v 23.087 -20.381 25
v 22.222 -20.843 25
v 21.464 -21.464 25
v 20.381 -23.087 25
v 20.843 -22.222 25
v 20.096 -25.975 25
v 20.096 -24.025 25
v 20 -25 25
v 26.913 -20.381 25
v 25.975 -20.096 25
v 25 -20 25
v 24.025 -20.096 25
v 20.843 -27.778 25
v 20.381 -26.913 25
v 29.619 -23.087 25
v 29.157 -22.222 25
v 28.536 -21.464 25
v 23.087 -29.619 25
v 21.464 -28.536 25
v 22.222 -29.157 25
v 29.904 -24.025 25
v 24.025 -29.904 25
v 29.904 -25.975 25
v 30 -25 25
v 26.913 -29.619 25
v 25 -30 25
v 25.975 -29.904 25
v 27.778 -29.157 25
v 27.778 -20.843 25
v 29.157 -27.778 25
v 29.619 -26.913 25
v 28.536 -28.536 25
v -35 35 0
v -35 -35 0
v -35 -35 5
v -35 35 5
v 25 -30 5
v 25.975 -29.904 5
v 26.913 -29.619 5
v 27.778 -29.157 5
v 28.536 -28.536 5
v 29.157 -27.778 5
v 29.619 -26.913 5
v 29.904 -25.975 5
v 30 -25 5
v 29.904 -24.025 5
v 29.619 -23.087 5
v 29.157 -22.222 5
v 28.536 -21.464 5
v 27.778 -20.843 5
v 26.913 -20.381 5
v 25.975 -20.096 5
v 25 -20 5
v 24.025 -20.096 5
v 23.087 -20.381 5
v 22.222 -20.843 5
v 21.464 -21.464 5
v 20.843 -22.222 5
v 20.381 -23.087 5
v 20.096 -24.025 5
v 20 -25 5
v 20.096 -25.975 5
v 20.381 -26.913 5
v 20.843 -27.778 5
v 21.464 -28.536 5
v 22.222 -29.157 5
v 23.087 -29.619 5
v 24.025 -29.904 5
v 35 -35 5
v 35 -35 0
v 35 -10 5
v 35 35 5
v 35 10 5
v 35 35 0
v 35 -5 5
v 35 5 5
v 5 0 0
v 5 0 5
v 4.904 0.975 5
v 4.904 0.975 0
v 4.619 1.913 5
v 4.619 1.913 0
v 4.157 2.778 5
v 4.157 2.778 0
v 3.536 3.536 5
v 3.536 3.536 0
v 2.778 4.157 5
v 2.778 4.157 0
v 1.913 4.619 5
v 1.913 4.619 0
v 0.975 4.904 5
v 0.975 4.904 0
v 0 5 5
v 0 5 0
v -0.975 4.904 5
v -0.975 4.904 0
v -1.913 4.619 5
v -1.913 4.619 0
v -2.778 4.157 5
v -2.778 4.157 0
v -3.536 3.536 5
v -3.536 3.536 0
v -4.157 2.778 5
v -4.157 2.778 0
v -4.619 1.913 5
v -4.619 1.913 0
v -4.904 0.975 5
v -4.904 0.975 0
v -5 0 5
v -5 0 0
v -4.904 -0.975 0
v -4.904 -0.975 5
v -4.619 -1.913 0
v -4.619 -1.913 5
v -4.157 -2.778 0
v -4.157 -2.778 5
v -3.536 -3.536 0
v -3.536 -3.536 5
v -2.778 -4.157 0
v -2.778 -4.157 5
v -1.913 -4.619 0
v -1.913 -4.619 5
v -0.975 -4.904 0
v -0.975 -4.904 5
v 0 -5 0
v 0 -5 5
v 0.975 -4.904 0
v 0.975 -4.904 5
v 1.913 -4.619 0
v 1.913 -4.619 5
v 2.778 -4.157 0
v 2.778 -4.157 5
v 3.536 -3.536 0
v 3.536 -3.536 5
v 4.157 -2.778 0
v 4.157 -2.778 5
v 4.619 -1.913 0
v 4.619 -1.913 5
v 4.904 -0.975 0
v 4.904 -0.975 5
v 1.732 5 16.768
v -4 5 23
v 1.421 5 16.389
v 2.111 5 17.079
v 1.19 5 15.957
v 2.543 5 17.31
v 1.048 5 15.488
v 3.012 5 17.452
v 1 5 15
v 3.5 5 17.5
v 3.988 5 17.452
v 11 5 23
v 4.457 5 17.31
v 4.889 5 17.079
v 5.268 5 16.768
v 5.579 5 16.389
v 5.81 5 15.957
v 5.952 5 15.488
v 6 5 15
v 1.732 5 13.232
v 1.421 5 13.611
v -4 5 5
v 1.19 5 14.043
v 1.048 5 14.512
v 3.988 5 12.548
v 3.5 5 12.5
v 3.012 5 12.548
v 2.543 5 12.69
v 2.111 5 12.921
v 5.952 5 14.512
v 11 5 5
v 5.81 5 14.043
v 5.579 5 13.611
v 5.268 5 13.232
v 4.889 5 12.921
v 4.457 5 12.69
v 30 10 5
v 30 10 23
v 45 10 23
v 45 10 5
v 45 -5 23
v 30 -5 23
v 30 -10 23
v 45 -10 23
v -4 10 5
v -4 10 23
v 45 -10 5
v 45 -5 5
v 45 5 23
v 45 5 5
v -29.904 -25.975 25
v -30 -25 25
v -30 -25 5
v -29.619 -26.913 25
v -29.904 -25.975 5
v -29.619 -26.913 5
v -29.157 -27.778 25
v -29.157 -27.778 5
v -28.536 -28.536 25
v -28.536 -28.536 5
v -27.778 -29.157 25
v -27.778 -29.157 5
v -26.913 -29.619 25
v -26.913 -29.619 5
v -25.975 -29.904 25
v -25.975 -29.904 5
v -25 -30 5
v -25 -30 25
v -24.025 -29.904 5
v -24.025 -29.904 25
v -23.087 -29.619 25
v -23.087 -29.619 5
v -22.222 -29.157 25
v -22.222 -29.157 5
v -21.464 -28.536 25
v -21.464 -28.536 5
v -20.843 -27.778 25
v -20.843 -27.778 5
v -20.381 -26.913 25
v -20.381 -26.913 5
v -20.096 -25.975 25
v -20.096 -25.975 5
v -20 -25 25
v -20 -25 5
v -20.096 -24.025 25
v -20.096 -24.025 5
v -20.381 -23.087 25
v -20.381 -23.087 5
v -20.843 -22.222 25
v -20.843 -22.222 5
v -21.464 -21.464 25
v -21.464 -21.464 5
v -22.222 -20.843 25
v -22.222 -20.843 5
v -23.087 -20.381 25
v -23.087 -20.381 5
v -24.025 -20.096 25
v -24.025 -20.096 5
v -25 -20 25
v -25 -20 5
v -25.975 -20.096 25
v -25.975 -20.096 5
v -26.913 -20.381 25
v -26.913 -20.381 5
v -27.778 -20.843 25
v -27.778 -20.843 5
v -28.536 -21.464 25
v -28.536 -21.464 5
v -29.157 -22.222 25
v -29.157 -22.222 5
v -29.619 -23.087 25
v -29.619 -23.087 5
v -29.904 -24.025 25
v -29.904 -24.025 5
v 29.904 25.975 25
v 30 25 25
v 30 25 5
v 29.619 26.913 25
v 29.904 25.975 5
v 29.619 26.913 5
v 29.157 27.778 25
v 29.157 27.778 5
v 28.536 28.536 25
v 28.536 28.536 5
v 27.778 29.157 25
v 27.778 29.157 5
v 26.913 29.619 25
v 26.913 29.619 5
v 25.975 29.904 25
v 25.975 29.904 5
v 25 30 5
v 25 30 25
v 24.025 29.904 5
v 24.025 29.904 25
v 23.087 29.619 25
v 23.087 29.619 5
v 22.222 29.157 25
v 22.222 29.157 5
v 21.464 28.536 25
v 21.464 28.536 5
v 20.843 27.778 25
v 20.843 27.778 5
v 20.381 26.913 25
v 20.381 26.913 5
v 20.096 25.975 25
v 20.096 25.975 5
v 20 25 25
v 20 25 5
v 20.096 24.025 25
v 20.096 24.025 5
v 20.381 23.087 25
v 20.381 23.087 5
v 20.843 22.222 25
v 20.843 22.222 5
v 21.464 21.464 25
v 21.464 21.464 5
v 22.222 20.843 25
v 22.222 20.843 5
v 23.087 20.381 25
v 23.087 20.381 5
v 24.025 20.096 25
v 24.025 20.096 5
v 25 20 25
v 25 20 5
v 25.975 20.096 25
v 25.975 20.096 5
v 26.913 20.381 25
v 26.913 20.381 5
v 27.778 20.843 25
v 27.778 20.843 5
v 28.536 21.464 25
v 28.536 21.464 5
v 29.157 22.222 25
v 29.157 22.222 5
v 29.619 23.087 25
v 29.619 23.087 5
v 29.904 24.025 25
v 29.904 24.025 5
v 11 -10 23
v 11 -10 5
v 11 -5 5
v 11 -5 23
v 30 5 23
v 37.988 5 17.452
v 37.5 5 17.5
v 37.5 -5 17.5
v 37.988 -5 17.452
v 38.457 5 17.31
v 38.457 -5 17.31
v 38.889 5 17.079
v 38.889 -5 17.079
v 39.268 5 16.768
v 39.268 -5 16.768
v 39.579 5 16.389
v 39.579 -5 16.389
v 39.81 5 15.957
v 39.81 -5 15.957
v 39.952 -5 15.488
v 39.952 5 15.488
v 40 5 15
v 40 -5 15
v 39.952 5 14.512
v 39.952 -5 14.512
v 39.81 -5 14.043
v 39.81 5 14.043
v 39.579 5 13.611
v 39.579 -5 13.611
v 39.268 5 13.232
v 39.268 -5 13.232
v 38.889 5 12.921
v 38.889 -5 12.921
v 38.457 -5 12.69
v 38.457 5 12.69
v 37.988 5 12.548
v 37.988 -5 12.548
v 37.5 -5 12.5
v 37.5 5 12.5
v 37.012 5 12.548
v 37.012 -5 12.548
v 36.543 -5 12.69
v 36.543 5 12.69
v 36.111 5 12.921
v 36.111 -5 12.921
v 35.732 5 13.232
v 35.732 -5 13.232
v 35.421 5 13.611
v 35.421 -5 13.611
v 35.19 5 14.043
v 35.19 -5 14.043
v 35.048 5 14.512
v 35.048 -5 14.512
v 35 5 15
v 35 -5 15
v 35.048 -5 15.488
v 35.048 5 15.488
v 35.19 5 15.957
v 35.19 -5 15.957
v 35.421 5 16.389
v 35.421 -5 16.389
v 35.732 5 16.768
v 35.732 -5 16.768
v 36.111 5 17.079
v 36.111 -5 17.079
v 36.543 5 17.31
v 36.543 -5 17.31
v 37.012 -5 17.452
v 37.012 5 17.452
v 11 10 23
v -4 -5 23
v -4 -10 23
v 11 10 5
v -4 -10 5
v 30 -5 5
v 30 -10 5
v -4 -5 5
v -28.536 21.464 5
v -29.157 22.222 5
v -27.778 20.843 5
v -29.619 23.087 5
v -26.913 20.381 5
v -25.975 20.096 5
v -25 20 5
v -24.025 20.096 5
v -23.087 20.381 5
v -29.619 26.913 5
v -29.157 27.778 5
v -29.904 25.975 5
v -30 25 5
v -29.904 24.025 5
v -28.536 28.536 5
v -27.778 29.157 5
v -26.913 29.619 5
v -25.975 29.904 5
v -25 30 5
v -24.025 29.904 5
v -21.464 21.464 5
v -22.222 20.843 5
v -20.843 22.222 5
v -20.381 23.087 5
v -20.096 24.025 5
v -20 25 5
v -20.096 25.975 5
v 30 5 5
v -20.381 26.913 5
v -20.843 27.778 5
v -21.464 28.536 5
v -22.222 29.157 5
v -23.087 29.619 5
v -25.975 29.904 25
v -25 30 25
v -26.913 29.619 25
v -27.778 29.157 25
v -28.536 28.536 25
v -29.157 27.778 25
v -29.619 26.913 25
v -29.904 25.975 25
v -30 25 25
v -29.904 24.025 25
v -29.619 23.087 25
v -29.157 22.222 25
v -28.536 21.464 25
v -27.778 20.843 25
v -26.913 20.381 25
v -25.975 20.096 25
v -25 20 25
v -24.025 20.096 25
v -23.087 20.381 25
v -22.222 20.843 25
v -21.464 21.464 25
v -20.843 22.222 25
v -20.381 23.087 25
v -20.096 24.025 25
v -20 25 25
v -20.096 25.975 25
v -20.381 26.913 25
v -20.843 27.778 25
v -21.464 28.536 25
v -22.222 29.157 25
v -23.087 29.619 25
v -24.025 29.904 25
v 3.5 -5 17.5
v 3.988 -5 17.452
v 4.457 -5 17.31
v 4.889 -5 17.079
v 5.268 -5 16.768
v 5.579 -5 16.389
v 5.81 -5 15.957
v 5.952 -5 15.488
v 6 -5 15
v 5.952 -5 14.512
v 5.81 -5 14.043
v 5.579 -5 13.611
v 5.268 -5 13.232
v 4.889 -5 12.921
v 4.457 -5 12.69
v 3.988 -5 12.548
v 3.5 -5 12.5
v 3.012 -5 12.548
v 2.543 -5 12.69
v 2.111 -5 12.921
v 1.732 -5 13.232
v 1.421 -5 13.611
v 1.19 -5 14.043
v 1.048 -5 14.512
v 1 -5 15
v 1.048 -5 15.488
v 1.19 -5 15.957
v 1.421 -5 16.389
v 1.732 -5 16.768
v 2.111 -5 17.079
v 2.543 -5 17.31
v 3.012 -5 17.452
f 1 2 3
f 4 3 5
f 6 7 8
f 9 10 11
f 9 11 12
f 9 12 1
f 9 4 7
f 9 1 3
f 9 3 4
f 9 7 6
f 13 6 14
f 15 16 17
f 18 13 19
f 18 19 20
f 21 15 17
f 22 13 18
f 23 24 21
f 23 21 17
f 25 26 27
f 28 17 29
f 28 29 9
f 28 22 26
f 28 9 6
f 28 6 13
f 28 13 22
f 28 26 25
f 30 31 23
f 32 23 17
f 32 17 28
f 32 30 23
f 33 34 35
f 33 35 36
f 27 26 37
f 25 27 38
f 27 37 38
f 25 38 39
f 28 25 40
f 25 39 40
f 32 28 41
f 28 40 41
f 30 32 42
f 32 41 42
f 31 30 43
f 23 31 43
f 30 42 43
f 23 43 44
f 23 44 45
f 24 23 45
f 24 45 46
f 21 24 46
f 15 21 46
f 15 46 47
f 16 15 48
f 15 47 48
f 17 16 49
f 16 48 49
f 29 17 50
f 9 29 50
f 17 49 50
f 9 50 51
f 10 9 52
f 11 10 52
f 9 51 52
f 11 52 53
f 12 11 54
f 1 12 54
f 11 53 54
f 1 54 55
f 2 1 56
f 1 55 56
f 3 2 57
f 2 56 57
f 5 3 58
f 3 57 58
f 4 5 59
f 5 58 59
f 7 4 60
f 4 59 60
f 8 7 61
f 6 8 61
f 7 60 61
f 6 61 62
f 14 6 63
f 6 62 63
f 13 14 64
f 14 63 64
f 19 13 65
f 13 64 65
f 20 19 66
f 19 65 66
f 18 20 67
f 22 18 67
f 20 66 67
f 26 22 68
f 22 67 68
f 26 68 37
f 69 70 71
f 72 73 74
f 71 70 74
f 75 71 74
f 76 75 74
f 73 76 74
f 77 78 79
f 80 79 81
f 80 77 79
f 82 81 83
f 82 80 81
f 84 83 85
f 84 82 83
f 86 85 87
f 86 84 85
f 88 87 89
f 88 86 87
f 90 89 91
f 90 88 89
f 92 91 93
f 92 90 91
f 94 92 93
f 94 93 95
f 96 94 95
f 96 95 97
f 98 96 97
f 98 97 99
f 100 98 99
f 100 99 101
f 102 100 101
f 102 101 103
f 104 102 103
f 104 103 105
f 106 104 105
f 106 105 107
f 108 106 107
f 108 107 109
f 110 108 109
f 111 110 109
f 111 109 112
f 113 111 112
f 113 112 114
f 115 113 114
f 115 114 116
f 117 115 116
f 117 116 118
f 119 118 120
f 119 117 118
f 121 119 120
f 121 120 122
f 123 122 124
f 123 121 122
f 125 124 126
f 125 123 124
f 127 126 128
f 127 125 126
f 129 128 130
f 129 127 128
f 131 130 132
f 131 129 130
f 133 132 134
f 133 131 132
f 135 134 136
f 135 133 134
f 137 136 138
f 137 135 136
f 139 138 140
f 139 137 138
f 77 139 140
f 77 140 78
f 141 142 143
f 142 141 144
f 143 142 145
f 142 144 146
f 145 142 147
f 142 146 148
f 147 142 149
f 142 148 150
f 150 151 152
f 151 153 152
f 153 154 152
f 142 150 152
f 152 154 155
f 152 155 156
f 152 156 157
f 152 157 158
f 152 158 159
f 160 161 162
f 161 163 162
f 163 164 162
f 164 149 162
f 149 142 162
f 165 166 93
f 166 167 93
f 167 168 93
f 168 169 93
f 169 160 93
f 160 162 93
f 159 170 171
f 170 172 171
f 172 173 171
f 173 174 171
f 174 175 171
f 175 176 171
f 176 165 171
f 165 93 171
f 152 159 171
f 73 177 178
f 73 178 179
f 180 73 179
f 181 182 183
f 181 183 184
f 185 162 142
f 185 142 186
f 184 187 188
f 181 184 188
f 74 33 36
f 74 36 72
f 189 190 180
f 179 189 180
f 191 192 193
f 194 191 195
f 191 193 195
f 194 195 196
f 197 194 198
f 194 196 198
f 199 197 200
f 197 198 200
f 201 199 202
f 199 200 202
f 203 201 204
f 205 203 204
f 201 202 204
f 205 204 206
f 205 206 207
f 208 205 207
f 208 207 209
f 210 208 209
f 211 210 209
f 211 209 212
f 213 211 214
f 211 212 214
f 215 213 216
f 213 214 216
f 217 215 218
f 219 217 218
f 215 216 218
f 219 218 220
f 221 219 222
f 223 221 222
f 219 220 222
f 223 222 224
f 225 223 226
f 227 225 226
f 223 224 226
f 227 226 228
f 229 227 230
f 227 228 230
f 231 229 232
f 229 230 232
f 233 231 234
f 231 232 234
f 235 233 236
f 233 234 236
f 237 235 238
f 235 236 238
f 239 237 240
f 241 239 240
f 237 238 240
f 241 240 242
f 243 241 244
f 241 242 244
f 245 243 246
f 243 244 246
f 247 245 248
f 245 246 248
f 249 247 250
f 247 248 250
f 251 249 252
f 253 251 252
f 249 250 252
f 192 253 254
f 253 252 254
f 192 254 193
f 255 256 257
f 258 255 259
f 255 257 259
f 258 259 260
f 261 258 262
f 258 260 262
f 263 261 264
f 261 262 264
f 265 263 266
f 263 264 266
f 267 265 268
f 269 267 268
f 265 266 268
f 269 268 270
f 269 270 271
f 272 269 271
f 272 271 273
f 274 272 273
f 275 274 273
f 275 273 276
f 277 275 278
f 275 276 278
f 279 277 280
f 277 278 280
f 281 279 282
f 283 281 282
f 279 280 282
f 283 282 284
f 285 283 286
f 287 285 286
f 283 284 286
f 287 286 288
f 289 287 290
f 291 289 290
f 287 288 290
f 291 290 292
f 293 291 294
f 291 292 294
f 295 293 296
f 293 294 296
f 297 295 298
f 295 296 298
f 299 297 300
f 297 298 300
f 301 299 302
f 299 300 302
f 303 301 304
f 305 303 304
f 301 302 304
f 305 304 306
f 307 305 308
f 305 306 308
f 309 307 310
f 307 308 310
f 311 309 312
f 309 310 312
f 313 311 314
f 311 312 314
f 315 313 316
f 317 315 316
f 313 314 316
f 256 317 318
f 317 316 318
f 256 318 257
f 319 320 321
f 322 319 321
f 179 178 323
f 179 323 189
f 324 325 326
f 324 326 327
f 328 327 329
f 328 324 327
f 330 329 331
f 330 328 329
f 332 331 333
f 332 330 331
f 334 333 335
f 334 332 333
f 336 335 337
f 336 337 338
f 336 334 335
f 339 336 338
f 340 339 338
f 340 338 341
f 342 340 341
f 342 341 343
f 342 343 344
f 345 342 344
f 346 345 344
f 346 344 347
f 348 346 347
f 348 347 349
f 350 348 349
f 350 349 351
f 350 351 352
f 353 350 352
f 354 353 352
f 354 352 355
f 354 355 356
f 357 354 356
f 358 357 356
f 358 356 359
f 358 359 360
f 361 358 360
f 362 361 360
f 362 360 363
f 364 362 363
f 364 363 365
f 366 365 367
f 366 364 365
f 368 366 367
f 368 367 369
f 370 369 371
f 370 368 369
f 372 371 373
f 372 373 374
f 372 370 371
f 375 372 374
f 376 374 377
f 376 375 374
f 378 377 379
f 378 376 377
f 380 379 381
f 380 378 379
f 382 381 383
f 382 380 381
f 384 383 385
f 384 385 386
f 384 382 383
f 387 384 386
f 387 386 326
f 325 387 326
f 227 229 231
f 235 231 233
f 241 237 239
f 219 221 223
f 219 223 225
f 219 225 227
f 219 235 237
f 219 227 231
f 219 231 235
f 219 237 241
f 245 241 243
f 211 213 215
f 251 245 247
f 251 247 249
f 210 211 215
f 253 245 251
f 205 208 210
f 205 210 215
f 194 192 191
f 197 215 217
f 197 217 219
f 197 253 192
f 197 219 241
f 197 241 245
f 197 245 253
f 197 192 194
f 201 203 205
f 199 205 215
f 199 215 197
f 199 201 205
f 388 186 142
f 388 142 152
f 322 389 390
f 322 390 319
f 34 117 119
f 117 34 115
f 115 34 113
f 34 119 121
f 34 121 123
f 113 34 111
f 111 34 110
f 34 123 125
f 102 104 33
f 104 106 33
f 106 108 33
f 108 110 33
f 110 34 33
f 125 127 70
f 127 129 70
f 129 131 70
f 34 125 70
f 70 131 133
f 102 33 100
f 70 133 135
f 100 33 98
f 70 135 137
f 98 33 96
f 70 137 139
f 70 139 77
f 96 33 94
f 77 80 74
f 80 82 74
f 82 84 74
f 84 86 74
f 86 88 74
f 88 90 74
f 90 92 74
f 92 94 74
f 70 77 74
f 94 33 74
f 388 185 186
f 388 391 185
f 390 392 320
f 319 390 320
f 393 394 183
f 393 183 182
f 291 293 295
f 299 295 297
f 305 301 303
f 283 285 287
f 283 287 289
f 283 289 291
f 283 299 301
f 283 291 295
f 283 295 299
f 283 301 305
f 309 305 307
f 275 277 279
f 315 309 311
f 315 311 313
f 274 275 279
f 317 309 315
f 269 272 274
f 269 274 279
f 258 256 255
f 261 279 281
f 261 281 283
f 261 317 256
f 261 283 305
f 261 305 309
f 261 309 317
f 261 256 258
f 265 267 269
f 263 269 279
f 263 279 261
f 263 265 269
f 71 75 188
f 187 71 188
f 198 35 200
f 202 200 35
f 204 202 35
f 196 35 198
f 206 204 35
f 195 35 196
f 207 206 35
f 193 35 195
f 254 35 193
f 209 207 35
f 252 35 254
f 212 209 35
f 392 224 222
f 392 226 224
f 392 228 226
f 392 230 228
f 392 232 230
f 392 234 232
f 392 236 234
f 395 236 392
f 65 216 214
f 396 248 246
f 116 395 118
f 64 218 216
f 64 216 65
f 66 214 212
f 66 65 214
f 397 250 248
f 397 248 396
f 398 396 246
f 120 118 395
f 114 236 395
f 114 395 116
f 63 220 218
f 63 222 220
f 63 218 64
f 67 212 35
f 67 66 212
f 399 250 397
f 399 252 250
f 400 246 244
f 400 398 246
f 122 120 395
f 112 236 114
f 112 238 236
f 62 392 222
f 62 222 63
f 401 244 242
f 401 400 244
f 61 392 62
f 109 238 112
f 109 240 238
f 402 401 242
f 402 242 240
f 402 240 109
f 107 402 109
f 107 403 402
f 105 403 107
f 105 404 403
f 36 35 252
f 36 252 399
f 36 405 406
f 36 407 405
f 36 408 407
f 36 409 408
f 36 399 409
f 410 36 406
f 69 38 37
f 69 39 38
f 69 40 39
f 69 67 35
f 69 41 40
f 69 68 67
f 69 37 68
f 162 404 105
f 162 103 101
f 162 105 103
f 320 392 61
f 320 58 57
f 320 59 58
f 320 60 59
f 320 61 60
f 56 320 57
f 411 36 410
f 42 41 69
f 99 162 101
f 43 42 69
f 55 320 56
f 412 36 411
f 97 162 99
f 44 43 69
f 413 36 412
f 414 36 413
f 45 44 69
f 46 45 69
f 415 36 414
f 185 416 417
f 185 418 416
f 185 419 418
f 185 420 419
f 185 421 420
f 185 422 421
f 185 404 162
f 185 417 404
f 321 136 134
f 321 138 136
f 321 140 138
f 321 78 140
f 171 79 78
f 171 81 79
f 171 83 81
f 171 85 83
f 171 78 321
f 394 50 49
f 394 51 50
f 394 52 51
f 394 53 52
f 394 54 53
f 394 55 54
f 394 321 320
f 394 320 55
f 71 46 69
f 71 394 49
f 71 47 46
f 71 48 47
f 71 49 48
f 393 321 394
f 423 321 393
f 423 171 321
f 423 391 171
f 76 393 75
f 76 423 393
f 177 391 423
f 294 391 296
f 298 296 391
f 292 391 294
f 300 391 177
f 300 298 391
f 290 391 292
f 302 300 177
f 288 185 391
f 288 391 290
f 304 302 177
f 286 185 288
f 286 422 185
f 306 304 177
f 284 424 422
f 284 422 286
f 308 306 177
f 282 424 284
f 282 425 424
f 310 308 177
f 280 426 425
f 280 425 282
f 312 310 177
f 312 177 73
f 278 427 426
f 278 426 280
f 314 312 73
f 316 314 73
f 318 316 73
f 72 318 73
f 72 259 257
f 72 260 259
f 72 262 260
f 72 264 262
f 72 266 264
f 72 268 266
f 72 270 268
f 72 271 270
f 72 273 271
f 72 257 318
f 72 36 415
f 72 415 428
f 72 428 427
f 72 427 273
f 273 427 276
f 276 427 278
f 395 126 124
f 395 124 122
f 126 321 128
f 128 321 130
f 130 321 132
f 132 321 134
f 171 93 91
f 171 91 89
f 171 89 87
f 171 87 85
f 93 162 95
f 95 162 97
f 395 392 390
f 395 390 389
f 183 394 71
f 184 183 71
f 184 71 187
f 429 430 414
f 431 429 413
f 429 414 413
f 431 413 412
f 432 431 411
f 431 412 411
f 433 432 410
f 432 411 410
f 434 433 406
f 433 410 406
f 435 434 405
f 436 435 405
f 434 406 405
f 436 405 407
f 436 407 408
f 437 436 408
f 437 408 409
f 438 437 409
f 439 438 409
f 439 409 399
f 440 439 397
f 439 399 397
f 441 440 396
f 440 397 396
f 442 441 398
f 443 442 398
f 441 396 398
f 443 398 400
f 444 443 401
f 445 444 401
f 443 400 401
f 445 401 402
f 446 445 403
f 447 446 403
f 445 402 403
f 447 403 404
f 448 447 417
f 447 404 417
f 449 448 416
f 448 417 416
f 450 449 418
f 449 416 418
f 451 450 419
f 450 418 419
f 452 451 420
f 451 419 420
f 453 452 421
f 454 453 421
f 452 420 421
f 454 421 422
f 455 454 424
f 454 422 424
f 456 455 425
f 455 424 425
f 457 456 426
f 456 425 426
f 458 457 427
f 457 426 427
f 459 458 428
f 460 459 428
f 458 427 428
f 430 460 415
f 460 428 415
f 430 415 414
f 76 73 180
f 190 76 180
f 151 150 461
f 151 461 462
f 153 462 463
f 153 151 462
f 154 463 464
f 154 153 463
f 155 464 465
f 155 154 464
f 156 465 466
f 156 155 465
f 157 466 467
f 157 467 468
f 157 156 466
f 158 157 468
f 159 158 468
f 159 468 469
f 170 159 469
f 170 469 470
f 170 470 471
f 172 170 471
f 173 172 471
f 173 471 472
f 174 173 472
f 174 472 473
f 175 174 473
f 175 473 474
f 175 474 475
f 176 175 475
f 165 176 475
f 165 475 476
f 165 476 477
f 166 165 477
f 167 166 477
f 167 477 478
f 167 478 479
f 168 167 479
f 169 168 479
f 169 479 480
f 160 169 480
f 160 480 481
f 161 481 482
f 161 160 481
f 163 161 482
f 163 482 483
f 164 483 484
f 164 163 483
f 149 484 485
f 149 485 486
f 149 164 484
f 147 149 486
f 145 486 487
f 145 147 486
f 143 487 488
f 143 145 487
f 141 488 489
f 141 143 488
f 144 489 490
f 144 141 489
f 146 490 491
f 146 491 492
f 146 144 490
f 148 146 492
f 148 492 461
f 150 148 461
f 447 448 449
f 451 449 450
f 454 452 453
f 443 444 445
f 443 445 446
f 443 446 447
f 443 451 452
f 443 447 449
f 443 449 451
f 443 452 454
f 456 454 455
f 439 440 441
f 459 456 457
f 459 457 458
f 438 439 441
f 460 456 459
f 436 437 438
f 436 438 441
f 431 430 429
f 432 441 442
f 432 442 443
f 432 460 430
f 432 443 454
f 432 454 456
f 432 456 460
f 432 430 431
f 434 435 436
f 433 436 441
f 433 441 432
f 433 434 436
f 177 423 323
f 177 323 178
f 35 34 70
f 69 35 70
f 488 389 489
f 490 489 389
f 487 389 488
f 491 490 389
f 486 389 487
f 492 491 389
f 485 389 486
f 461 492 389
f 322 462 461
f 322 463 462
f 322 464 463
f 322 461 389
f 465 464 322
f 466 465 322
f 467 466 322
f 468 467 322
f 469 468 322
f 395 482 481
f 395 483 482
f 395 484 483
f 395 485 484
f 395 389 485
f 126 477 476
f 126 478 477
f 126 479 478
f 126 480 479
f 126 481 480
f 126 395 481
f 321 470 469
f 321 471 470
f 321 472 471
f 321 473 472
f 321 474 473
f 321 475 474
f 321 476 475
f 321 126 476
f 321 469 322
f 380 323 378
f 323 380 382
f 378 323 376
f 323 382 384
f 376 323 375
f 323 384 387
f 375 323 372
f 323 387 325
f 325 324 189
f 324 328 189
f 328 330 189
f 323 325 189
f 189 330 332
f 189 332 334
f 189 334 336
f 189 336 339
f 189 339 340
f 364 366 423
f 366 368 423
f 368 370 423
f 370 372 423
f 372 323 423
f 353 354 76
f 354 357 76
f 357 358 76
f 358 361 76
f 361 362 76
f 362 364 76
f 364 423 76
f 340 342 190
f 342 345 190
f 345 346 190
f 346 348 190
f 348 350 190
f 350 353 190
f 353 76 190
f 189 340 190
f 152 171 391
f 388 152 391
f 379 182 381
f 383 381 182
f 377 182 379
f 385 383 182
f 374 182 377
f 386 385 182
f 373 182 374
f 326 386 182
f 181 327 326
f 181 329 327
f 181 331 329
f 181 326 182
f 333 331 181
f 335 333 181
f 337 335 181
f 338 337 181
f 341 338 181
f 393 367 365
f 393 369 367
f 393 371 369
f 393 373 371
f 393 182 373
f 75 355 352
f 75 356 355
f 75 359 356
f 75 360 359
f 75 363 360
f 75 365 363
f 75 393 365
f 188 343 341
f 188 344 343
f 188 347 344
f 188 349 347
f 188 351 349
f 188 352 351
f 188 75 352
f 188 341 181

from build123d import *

# Parameters (mm, degrees)
SKETCH1_W           = 70
SKETCH1_H           = 70
SKETCH1_R           = 5
BOSS_EXTRUDE1_DEPTH = 5
SKETCH2_R           = 5
BOSS_EXTRUDE2_DEPTH = 20
CIRPATTERN1_COUNT   = 4
SKETCH3_W           = 15
SKETCH3_H           = 5
BOSS_EXTRUDE3_DEPTH = 18
SKETCH4_R           = 2.5
BOSS_EXTRUDE4_DEPTH = 20


with BuildPart() as part:
    # Sketch1 → Boss-Extrude1 (new body)
    with BuildSketch(Plane.XY):
        Rectangle(SKETCH1_W, SKETCH1_H)
        Circle(SKETCH1_R, mode=Mode.SUBTRACT)
    extrude(amount=BOSS_EXTRUDE1_DEPTH)

    # Sketch2 → Boss-Extrude2 (add)
    with BuildSketch(Plane.XY.offset(5)):
        with Locations((25, 25)):
            Circle(SKETCH2_R)
    boss_extrude2 = extrude(amount=BOSS_EXTRUDE2_DEPTH)

    # CirPattern1: Boss-Extrude2 ×4 about axis
    cirpattern1_axis = Axis((0, 0, 0), (0, 0, 1))
    for i in range(1, CIRPATTERN1_COUNT):
        add(boss_extrude2.rotate(cirpattern1_axis, i * 360 / CIRPATTERN1_COUNT))

    # Sketch3 → Boss-Extrude3 (add)
    with BuildSketch(Plane.XY.offset(5)):
        with Locations((3.5, -7.5)):
            Rectangle(SKETCH3_W, SKETCH3_H)
        with Locations((3.5, 7.5)):
            Rectangle(SKETCH3_W, SKETCH3_H)
        with Locations((37.5, -7.5)):
            Rectangle(SKETCH3_W, SKETCH3_H)
        with Locations((37.5, 7.5)):
            Rectangle(SKETCH3_W, SKETCH3_H)
    extrude(amount=BOSS_EXTRUDE3_DEPTH)

    # Sketch4 → Boss-Extrude4 (add)
    with BuildSketch(Plane(origin=(0, 10, 0), x_dir=(1, 0, 0), z_dir=(0, 1, 0))):
        with Locations(Location((3.5, -15, 0), (0, 0, 270))):
            Circle(SKETCH4_R)
        with Locations(Location((37.5, -15, 0), (0, 0, 270))):
            Circle(SKETCH4_R)
    extrude(amount=-BOSS_EXTRUDE4_DEPTH)


solid = part.part
